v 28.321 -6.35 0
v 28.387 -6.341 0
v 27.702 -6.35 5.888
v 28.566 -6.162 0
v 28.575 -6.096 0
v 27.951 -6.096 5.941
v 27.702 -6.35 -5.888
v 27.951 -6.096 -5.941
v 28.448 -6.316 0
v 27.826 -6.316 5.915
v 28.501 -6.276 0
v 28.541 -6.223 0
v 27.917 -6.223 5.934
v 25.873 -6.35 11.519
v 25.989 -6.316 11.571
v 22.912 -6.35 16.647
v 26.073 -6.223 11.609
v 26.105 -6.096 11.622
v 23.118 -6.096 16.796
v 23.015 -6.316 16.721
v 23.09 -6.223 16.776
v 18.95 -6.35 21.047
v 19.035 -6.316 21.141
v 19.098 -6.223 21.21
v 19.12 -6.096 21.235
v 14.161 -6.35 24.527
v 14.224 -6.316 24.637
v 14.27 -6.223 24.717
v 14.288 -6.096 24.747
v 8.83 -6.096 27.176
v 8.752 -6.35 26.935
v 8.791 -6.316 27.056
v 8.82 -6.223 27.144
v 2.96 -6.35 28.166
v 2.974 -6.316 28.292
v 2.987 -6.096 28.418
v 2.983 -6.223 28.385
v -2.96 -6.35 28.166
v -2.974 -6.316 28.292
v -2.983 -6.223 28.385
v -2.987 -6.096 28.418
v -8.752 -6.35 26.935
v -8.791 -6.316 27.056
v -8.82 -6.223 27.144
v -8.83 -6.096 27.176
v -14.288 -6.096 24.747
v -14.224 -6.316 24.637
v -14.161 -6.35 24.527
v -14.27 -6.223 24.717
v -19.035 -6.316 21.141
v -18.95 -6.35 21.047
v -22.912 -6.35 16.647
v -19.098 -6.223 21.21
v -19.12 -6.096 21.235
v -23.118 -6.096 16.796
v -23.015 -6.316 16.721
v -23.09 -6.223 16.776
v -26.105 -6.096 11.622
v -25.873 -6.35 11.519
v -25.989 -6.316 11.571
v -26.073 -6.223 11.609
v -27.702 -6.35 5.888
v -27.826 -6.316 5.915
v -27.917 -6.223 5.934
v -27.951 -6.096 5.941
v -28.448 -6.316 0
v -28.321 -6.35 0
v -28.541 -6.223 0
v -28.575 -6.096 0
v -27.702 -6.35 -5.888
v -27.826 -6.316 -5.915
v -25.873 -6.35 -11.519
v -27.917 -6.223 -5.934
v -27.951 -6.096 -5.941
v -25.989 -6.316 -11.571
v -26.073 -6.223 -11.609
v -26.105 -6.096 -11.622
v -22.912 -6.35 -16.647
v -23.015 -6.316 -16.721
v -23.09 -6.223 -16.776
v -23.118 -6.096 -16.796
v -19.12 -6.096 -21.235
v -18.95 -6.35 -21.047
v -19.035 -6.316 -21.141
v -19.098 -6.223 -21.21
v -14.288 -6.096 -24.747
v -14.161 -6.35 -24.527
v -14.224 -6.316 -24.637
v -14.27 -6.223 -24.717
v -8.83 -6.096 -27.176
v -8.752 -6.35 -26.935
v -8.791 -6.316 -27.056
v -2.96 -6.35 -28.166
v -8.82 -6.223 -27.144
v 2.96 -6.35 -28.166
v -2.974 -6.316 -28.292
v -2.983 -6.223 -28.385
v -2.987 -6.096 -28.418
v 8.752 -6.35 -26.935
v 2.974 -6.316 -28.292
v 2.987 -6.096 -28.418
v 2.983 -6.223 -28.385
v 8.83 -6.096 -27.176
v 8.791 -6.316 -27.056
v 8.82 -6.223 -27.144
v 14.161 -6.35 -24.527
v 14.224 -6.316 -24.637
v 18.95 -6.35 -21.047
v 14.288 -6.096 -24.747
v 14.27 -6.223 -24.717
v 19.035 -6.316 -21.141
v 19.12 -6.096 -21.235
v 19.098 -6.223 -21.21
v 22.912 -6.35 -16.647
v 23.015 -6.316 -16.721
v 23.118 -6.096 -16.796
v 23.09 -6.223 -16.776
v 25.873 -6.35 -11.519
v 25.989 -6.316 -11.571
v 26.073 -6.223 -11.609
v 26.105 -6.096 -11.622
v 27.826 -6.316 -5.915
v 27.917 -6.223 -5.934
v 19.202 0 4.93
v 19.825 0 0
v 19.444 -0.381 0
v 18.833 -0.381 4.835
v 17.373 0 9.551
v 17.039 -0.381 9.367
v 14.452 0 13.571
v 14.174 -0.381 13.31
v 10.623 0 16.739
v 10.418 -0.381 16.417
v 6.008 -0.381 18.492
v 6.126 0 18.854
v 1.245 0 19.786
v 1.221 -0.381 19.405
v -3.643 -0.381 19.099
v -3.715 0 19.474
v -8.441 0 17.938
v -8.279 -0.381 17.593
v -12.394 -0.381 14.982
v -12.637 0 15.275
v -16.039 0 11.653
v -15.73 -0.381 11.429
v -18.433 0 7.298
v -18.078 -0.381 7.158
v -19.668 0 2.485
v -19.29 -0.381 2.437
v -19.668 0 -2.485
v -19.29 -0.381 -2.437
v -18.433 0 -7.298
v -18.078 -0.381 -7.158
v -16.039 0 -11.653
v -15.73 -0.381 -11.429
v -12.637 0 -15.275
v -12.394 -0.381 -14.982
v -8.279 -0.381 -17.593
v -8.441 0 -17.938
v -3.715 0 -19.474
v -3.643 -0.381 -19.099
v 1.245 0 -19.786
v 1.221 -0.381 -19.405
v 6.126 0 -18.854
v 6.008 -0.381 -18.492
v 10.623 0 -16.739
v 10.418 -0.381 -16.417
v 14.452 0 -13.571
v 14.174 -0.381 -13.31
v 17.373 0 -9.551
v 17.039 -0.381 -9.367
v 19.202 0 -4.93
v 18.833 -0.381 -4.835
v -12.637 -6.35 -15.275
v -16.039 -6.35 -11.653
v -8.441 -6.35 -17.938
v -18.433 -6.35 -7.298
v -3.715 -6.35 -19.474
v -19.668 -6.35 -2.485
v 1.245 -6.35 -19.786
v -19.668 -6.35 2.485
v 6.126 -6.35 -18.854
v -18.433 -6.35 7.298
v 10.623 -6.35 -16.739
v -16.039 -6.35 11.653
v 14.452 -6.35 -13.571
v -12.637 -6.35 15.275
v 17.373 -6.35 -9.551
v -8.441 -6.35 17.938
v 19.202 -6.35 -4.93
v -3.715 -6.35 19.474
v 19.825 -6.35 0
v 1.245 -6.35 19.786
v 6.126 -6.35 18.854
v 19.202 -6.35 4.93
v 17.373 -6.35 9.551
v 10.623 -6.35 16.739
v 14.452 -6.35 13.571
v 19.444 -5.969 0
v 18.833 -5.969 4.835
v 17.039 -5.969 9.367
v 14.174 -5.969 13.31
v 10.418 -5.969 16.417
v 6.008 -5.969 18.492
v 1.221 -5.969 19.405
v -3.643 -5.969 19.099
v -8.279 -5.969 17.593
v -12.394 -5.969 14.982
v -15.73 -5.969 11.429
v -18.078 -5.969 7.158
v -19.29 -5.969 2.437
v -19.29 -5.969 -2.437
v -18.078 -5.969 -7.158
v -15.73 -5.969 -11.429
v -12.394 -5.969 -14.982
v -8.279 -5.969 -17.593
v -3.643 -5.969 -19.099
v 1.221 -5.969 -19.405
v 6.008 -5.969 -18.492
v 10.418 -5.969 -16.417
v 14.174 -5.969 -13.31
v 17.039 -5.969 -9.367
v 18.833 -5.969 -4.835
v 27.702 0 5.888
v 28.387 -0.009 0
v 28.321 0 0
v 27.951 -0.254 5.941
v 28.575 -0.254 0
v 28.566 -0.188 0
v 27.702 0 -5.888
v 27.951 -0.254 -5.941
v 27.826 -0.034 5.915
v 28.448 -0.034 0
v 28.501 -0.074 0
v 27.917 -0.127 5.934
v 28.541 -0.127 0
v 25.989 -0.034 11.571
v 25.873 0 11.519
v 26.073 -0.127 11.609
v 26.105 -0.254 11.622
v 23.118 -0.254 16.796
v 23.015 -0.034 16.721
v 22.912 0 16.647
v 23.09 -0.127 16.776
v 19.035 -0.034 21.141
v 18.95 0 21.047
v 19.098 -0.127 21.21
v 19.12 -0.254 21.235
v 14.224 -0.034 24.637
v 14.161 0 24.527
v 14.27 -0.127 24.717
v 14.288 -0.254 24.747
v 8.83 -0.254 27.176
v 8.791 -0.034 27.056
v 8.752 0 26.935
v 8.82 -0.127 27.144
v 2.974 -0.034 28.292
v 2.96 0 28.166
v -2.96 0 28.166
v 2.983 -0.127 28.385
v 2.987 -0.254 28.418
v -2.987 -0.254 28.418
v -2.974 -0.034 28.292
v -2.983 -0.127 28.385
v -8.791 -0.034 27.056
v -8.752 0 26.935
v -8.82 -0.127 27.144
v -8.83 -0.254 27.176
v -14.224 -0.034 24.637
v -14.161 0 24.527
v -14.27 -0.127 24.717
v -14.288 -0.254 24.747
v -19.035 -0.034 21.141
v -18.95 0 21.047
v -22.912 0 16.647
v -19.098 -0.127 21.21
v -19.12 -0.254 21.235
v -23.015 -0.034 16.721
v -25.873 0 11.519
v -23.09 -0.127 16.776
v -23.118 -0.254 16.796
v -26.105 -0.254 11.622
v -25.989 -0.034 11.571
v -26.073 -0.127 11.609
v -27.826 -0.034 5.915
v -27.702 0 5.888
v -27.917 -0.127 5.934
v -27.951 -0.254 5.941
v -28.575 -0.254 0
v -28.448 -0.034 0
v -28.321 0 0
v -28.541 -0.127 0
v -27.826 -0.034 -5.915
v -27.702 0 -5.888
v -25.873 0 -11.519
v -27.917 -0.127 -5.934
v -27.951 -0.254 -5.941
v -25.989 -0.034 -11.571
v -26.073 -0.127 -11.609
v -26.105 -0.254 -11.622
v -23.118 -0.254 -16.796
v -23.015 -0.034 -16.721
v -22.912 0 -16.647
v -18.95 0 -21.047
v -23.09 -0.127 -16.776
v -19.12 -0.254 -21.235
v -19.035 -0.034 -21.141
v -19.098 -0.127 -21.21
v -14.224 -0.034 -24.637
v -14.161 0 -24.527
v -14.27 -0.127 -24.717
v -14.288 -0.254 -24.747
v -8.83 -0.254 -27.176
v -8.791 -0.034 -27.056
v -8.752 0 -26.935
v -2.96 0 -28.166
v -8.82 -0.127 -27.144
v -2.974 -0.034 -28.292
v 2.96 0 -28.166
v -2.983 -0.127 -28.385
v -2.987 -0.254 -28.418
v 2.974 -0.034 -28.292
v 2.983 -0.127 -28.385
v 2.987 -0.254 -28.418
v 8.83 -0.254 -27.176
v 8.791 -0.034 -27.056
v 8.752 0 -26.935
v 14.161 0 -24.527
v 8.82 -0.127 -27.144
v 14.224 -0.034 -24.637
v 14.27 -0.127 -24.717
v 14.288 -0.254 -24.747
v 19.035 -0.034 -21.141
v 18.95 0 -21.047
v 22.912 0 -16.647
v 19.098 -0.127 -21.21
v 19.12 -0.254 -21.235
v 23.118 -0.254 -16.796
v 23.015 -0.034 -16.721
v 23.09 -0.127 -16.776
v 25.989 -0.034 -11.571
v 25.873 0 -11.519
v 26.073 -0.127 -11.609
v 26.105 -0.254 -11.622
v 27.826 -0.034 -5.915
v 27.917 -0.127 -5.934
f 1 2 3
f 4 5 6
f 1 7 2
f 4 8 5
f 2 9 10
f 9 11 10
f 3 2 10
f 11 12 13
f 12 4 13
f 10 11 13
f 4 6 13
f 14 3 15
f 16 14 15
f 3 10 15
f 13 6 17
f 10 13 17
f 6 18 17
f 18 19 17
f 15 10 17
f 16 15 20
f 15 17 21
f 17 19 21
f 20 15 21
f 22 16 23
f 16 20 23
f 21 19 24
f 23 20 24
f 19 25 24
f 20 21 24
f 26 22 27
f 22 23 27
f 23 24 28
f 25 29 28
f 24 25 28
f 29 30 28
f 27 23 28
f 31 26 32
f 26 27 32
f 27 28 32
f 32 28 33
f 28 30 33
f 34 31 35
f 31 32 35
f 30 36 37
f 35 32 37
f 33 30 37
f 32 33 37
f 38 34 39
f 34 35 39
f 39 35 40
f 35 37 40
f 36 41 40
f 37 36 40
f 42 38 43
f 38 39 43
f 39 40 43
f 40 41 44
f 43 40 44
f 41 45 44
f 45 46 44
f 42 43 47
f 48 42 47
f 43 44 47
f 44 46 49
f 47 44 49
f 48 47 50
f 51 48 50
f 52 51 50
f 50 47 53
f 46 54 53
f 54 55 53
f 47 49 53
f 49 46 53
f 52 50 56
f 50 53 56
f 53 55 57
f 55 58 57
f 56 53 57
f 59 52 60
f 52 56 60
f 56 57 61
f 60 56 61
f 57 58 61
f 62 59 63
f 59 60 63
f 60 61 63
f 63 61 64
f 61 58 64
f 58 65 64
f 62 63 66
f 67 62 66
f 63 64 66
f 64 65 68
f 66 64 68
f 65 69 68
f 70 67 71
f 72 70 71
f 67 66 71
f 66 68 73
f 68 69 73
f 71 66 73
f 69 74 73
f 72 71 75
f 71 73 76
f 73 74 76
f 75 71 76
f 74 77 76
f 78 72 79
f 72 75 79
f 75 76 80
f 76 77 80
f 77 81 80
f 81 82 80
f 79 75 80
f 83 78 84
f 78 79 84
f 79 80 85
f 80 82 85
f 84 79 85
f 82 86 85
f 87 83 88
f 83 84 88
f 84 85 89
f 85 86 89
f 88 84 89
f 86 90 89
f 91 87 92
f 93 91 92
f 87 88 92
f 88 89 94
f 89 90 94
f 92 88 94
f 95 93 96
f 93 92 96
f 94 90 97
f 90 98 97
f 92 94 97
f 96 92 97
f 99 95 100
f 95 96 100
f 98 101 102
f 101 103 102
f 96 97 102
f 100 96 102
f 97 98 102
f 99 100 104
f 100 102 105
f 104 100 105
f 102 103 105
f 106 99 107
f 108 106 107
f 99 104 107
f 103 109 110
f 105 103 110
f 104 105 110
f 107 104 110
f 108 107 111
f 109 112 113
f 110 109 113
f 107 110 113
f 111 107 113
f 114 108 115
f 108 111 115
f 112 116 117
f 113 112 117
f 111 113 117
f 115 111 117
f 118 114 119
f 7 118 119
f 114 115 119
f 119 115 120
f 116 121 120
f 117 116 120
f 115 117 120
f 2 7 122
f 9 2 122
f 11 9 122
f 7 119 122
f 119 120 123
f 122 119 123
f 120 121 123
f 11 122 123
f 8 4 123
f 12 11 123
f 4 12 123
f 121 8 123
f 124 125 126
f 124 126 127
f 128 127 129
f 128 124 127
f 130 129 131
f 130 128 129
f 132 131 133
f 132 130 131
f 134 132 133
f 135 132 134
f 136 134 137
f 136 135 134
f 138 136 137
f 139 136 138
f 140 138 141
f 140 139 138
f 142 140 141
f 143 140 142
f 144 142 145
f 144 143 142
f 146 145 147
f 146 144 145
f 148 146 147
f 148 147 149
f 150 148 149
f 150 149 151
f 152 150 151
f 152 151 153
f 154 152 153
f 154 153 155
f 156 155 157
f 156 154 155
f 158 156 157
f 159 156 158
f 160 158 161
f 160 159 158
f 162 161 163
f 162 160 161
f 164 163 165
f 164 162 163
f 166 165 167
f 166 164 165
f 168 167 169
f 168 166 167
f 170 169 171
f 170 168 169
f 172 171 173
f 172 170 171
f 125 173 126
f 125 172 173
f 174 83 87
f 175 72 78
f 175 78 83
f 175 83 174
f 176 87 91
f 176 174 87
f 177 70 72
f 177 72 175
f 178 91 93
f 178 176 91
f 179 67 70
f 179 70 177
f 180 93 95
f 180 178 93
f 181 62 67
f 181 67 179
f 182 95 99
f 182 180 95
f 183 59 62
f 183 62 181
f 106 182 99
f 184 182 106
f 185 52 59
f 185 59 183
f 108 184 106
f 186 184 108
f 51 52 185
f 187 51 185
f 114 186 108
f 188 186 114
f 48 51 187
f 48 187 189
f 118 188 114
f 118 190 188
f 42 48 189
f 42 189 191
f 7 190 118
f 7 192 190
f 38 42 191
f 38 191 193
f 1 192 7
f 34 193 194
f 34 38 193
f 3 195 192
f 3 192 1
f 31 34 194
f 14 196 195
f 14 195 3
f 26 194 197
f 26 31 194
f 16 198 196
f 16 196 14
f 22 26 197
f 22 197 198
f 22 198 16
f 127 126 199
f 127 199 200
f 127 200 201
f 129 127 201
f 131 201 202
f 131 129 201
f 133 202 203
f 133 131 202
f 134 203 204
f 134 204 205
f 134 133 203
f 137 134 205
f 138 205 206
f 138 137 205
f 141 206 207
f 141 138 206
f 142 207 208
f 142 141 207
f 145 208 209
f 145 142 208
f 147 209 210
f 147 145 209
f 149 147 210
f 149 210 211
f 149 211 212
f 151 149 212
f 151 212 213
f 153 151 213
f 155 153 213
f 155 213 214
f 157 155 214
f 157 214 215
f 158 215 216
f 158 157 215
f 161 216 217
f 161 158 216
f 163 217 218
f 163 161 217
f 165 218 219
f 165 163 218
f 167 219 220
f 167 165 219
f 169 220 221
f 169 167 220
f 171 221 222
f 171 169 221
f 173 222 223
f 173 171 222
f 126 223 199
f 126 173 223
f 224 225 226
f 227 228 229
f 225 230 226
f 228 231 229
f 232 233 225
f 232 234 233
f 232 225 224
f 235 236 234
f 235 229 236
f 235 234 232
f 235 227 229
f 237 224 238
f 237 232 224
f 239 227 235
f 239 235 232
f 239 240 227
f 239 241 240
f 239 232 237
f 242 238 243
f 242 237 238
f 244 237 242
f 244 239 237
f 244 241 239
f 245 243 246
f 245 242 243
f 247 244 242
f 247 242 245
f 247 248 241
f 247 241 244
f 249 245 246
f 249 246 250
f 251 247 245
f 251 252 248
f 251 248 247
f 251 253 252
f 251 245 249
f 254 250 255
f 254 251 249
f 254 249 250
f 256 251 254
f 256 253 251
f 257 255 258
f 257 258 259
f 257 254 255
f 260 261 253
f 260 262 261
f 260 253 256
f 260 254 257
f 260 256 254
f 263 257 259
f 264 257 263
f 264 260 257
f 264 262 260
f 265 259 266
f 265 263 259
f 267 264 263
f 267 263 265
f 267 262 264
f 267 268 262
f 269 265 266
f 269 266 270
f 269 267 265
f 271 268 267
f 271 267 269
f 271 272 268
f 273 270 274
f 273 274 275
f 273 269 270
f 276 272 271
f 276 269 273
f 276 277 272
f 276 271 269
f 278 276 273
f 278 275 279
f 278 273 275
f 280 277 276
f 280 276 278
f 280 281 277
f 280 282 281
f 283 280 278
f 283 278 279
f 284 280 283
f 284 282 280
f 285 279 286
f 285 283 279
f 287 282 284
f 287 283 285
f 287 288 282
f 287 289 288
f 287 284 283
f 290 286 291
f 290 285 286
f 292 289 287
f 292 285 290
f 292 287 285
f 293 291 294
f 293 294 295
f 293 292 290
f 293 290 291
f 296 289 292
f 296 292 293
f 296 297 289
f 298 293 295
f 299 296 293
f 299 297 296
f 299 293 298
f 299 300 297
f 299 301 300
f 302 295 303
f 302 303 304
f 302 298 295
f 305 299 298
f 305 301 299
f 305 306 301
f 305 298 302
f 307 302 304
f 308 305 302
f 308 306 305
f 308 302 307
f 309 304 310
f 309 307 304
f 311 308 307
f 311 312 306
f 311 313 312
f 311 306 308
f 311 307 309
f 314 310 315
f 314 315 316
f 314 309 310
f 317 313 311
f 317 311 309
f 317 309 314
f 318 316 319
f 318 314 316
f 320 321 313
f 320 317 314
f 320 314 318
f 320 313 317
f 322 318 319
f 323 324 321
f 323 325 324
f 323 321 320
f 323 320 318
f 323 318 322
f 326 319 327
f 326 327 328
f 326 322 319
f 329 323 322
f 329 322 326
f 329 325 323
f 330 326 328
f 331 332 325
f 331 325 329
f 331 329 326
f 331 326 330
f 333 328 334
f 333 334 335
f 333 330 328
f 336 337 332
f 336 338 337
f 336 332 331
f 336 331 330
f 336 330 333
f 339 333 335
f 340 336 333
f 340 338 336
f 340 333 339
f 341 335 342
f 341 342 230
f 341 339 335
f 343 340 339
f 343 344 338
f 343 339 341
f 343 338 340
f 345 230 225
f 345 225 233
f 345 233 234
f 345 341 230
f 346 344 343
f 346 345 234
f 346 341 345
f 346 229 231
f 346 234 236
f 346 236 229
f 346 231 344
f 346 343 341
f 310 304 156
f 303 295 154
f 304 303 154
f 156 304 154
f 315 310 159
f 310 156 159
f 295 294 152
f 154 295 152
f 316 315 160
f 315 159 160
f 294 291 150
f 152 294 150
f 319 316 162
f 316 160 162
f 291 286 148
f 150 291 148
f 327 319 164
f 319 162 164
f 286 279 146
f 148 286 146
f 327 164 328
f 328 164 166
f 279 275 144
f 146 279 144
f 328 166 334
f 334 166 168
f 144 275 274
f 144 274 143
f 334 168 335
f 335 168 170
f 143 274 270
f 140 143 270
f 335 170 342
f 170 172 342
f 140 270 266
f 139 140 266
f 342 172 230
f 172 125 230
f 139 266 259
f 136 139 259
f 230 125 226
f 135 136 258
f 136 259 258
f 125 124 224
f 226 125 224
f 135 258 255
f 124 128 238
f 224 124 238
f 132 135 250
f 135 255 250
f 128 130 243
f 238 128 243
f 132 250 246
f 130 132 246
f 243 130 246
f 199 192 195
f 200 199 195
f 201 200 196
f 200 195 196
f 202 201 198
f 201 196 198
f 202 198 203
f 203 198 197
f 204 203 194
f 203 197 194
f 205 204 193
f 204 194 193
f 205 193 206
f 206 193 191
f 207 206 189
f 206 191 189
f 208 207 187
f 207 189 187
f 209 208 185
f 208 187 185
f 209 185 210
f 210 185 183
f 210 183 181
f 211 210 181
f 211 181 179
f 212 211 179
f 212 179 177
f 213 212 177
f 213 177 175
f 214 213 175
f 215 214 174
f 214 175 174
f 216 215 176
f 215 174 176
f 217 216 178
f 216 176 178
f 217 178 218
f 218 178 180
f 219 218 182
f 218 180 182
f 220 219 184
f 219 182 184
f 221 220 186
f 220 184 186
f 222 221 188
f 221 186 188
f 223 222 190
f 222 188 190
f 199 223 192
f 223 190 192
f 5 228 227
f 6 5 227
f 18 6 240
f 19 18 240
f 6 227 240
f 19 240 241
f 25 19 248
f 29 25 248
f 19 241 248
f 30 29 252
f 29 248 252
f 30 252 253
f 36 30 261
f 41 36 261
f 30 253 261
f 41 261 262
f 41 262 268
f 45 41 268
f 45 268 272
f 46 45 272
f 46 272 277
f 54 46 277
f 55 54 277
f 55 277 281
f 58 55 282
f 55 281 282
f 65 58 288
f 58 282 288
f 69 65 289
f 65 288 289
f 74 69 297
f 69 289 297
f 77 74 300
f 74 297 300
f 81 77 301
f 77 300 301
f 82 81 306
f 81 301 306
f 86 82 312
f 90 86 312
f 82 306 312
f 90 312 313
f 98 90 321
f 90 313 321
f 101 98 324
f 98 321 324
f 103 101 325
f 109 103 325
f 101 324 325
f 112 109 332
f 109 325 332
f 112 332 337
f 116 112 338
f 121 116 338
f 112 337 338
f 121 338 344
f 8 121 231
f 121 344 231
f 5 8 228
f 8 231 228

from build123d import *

# Parameters (mm, degrees)
F0_R     = 28.575
F0_R_2   = 19.4437
F1_DEPTH = 6.35
F2_SIZE  = 0.381
F3_R     = 0.254


with BuildPart() as f1:
    # F0 (on Front) → F1 (new body)
    with BuildSketch(Plane.XZ):
        Circle(F0_R)
        Circle(F0_R_2, mode=Mode.SUBTRACT)
    extrude(amount=F1_DEPTH)

    # F2
    f2_edges = [f1.edges().sort_by_distance(p)[0] for p in [
        (-19.4437, -6.35, 0),
        (-19.4437, 0, 0),
    ]]
    chamfer(f2_edges, length=F2_SIZE)

    # F3
    f3_edges = [f1.edges().sort_by_distance(p)[0] for p in [
        (-28.575, 0, 0),
        (-28.575, -6.35, 0),
    ]]
    fillet(f3_edges, radius=F3_R)


solid = f1.part
